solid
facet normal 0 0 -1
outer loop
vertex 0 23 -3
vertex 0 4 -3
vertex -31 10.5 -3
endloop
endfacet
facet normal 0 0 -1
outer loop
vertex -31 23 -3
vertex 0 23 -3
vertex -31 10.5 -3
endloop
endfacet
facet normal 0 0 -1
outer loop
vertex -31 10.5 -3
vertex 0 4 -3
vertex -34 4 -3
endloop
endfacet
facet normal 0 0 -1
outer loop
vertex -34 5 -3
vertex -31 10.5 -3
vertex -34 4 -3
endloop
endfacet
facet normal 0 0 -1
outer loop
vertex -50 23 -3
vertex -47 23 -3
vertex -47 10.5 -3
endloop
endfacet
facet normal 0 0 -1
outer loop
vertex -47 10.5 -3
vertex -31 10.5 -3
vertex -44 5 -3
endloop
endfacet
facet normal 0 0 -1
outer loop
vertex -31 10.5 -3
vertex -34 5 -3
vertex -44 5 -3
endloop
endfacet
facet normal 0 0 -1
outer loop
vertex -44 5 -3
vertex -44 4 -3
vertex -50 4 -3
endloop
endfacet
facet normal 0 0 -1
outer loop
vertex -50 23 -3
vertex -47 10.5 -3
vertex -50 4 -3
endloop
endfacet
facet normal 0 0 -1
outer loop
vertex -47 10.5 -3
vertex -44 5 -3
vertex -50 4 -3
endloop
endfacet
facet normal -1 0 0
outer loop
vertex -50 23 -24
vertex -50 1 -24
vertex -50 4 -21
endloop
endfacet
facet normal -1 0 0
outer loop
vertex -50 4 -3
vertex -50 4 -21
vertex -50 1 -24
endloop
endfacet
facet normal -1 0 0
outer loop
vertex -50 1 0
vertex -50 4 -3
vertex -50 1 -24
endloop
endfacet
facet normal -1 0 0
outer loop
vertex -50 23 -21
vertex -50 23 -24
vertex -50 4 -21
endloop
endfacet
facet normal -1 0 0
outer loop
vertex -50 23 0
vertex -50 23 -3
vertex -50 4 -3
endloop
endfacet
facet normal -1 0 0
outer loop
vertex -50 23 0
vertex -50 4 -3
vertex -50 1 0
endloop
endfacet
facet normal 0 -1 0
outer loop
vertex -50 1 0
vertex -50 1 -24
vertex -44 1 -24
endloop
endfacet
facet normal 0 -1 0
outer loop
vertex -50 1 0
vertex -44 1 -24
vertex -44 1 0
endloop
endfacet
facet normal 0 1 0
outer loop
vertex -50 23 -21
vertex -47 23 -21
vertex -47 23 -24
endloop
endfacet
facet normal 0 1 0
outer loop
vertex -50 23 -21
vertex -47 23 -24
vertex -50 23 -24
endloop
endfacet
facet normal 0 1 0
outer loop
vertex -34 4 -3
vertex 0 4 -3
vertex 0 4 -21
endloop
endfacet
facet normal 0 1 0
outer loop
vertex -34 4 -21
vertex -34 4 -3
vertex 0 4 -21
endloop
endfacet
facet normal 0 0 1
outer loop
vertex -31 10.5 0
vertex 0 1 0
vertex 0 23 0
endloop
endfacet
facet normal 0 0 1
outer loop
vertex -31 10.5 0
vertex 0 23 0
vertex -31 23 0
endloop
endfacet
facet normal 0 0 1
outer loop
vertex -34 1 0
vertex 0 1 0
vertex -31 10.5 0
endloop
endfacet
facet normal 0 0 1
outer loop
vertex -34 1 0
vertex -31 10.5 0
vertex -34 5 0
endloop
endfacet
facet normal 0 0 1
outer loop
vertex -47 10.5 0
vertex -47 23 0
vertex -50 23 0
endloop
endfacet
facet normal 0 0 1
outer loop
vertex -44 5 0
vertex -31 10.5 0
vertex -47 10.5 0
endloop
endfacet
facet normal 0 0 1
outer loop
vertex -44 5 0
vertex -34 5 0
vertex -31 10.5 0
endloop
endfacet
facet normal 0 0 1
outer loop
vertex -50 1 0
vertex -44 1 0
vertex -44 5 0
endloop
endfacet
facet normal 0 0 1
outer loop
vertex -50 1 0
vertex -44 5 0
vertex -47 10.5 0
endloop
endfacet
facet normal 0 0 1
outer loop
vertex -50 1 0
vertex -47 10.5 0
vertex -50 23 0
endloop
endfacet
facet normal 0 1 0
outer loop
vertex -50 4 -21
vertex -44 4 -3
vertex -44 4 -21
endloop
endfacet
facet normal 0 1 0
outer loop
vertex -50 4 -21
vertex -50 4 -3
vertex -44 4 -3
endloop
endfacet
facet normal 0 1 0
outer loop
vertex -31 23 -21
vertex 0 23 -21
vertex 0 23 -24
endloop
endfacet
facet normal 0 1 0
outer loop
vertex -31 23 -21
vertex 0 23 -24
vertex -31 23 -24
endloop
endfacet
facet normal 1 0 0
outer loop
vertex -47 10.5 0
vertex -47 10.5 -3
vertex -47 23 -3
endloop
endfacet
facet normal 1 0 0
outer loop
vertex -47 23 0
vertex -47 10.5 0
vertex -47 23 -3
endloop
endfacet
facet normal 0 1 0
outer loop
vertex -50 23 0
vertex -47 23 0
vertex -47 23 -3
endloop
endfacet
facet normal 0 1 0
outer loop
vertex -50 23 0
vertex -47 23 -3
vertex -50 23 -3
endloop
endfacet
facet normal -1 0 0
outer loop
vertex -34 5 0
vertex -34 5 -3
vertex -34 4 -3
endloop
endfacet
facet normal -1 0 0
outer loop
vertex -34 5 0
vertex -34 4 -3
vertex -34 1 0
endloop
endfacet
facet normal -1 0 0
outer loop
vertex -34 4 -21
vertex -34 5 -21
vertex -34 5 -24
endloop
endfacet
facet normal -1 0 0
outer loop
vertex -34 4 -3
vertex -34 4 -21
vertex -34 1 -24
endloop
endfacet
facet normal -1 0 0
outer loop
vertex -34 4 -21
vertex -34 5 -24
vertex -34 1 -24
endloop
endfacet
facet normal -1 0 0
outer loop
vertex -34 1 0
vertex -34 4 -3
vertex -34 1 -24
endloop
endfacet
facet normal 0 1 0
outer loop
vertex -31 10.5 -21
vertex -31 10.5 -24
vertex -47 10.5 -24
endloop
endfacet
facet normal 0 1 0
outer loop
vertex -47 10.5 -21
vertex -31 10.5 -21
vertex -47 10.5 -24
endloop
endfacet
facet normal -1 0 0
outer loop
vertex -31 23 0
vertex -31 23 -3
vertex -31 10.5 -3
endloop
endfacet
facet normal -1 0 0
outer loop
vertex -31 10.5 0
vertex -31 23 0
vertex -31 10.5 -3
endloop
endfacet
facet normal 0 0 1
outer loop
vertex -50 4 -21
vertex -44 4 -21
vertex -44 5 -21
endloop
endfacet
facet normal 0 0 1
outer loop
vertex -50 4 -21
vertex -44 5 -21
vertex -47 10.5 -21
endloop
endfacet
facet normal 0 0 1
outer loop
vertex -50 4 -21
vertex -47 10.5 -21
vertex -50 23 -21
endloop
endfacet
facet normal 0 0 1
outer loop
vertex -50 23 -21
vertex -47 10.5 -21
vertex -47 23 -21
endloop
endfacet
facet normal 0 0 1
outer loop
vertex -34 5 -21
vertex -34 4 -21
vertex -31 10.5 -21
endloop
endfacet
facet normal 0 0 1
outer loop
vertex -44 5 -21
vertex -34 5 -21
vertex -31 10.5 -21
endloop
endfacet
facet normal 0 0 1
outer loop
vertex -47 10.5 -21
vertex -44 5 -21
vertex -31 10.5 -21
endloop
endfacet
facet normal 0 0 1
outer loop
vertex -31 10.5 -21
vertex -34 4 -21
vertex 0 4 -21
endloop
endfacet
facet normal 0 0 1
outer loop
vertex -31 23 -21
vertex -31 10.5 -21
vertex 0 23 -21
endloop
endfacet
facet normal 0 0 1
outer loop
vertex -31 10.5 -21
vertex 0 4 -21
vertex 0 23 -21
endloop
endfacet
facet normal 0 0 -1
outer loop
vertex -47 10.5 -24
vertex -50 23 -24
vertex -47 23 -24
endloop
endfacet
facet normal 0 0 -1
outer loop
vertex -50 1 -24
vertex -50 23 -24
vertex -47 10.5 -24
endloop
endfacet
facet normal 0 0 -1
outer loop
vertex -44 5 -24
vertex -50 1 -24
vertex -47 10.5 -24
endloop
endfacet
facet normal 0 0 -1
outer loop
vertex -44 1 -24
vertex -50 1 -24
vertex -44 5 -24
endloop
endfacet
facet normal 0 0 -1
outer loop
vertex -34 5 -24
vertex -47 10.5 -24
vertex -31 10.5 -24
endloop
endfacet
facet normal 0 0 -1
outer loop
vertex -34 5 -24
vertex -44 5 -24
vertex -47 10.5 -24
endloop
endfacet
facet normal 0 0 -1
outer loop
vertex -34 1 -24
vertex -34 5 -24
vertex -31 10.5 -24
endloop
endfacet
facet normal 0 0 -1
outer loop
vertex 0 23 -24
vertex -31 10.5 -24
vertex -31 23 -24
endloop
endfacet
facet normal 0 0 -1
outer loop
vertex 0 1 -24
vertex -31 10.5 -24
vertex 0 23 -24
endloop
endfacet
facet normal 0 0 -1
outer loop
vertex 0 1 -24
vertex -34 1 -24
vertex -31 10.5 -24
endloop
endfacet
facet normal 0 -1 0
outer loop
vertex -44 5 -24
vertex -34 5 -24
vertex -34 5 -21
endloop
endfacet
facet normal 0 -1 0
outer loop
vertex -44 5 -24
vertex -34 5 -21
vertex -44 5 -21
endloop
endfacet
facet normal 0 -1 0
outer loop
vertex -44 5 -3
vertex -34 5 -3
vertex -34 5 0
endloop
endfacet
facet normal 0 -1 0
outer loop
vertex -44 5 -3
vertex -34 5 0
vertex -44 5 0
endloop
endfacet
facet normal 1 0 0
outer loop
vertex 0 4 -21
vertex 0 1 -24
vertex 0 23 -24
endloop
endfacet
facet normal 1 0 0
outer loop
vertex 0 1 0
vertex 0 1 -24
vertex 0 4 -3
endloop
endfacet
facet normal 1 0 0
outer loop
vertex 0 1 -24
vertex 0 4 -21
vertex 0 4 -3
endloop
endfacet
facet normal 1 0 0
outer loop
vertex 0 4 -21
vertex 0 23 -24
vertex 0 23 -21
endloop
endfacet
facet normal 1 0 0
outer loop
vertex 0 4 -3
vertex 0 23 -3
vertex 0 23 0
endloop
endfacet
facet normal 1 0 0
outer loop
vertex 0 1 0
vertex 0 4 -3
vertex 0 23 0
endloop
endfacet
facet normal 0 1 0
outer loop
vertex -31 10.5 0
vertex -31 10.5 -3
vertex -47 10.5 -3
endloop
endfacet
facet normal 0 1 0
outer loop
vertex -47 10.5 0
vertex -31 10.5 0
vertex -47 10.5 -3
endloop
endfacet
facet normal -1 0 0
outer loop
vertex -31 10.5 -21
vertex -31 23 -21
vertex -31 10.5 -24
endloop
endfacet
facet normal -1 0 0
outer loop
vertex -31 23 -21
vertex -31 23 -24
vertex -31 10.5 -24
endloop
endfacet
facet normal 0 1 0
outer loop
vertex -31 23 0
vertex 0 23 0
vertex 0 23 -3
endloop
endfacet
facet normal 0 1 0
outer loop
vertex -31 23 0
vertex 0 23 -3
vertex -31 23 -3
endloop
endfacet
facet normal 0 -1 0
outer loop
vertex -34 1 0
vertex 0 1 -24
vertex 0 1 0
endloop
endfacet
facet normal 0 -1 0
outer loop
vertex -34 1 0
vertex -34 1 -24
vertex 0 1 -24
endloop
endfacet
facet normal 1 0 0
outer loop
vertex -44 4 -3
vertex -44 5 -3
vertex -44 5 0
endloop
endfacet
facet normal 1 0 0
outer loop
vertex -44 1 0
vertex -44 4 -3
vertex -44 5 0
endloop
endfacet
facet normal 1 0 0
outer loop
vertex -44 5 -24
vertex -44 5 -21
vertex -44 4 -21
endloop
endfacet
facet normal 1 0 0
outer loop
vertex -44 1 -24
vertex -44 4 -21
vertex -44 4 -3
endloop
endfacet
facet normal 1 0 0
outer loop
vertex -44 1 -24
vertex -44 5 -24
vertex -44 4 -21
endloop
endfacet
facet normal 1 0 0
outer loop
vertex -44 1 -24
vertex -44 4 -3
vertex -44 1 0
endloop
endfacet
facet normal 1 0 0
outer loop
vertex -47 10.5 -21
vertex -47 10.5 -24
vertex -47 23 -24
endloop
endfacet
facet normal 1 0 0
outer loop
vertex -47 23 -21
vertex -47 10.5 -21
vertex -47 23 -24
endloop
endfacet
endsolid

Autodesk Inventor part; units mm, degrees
ref_plane "YZ Plane" through (0, 0, 0) normal (1, 0, 0) x (0, 1, 0)
ref_plane "XZ Plane" through (0, 0, 0) normal (0, 1, 0) x (-1, 0, 0)
ref_plane "XY Plane" through (0, 0, 0) normal (0, 0, 1) x (1, 0, 0)
sketch "Sketch3" plane through (0, 0, 0) normal (0, 1, 0) x (-1, 0, 0)
  line L0 (0, 0) -> (35, 0)
  line L1 (35, 0) -> (35, -24)
  line L2 (35, -24) -> (0, -24)
  line L3 (0, -24) -> (0, 0)
  dimension "d7" = 35
  dimension "d8" = 24
extrude "Extrusion2" add sketch "Sketch3" along normal blind 23
sketch "Sketch4" plane through (0, 0, 0) normal (0, -1, 0) x (1, 0, 0)
  line L0 (-35, 0) -> (0, 0) projected
  line L1 (-35, 0) -> (0, 0)
  line L2 (-35, -24) -> (-35, 0) projected
  line L3 (-35, -12) -> (-17.5, -12)
  line L4 (-35, -21) -> (0, -21)
  line L5 (0, -21) -> (0, -3)
  line L6 (0, -3) -> (-35, -3)
  line L7 (-35, -3) -> (-35, -21)
  line L8 (-35, -21) -> (0, -3) construction
  line L9 (0, -21) -> (-35, -3) construction
  dimension "d11" = 35
  dimension "d12" = 18
extrude "Extrusion3" cut sketch "Sketch4" against normal blind 20
sketch "Sketch5" plane through (0, 0, -24) normal (1, 0, 0) x (0, 0, -1)
  line L0 (-21, 0) -> (-24, 0) projected
  line L1 (0, 0) -> (0, 23) projected
  line L2 (-24, 0) -> (0, 0)
  line L3 (0, 0) -> (0, 1)
  line L4 (0, 1) -> (-24, 1)
  line L5 (-24, 1) -> (-24, 0)
  dimension "d15" = 1
extrude "Extrusion4" cut sketch "Sketch5" against normal blind 50.1625
sketch "Sketch6" plane through (-35, 23, -24) normal (-1, 0, 0) x (0, 0, 1)
  line L0 (3, -22) -> (0, -22) projected
  line L1 (0, -22) -> (3, -22)
  line L2 (3, -22) -> (3, -3)
  line L3 (3, -3) -> (0, -3)
  line L4 (0, -3) -> (0, -22)
  line L5 (24, 0) -> (0, 0) projected
  line L6 (0, -3) -> (24, -3)
  line L7 (24, -3) -> (24, 0)
  line L8 (24, 0) -> (0, 0)
  line L9 (0, 0) -> (0, -3)
  line L10 (24, -22) -> (24, 0) projected
  line L11 (21, -22) -> (21, -3) projected
  line L12 (24, 0) -> (21, 0)
  line L13 (21, 0) -> (21, -22)
  line L14 (21, -22) -> (24, -22)
  line L15 (24, -22) -> (24, 0)
  point P0 (24, -23)
extrude "Extrusion5" add sketch "Sketch6" along normal blind 15
sketch "Sketch7" plane through (-50, 23, -24) normal (-1, 0, 0) x (0, 0, 1)
  line L0 (24, 0) -> (0, 0) projected
  line L1 (12, 0) -> (12, -22)
  line L2 (0, 0) -> (0, -22) projected
  line L3 (0, 0) -> (24, 0)
  line L4 (0, -22) -> (3, -22) projected
  line L5 (21, -22) -> (24, -22) projected
  line L6 (0, -22) -> (24, -22)
  point P0 (24, -23)
sketch "Sketch8" plane through (-50, 23, -24) normal (-1, 0, 0) x (0, 0, 1)
  line L0 (0, -22) -> (3, -22) projected
  line L1 (21, -3) -> (21, -22) projected
  line L2 (3, -22) -> (21, -22)
  line L3 (21, -22) -> (21, -19)
  line L4 (21, -19) -> (3, -19)
  line L5 (3, -19) -> (3, -22)
  point P0 (24, -23)
  dimension "d20" = 3
extrude "Extrusion6" add sketch "Sketch8" against normal up to surface (50 mm away)
sketch "Sketch9" plane through (0, 23, 0) normal (1, 0, 0) x (0, 0, -1)
  line L0 (3, -19) -> (3, -3) projected
  line L1 (0, 0) -> (24, 0) projected
  line L2 (3, -3) -> (21, -3)
  line L3 (21, -3) -> (21, 0)
  line L4 (21, 0) -> (3, 0)
  line L5 (3, 0) -> (3, -3)
  point P0 (0, -23)
  point P1 (3, 0)
  dimension "d23" = 18
extrude "Extrusion7" cut sketch "Sketch9" against normal up to surface (50 mm away)
sketch "Sketch10" plane through (0, 1, -24) normal (0, 0, -1) x (-1, 0, 0)
  line L0 (50, 22) -> (50, 3) projected
  line L1 (50, 22) -> (47, 22)
  line L2 (0, 22) -> (50, 22) projected
  line L3 (47, 22) -> (31, 22)
  line L4 (31, 22) -> (31, 9.5)
  line L5 (31, 9.5) -> (47, 9.5)
  line L6 (47, 9.5) -> (47, 22)
  point P0 (0, -1)
  dimension "d26" = 3
  dimension "d27" = 16
  dimension "d28" = 12.5
extrude "Extrusion8" cut sketch "Sketch10" against normal blind 30.6375
sketch "Sketch12" plane through (0, 1, -24) normal (0, 0, -1) x (-1, 0, 0)
  line L0 (31, 9.5) -> (47, 9.5) projected
  line L1 (47, 9.5) -> (39, 9.5)
  line L2 (39, 9.5) -> (39, 0)
  line L3 (50, 0) -> (0, 0) projected
  line L4 (36, 4) -> (42, 4)
  line L5 (42, 4) -> (42, -4)
  line L6 (42, -4) -> (36, -4)
  line L7 (36, -4) -> (36, 4)
  line L8 (36, 4) -> (42, -4) construction
  line L9 (42, 4) -> (36, -4) construction
  line L10 (42, 4) -> (44, 4)
  line L11 (44, 4) -> (44, 0)
  line L12 (44, 0) -> (42, 0)
  line L13 (42, 0) -> (42, 4)
  line L14 (36, 4) -> (34, 4)
  line L15 (34, 4) -> (34, 0)
  line L16 (34, 0) -> (36, 0)
  line L17 (36, 0) -> (36, 4)
  point P0 (0, -1)
  dimension "d34" = 6
  dimension "d35" = 8
  dimension "d36" = 2
  dimension "d37" = 2
extrude "Extrusion10" cut sketch "Sketch12" against normal up to surface (24 mm away) contours L4 L5 L3 L2 | L2 L3 L7 L4 | L7 L3 L15 L14 | L10 L11 L3 L5
properties part number "batteryContainer"
